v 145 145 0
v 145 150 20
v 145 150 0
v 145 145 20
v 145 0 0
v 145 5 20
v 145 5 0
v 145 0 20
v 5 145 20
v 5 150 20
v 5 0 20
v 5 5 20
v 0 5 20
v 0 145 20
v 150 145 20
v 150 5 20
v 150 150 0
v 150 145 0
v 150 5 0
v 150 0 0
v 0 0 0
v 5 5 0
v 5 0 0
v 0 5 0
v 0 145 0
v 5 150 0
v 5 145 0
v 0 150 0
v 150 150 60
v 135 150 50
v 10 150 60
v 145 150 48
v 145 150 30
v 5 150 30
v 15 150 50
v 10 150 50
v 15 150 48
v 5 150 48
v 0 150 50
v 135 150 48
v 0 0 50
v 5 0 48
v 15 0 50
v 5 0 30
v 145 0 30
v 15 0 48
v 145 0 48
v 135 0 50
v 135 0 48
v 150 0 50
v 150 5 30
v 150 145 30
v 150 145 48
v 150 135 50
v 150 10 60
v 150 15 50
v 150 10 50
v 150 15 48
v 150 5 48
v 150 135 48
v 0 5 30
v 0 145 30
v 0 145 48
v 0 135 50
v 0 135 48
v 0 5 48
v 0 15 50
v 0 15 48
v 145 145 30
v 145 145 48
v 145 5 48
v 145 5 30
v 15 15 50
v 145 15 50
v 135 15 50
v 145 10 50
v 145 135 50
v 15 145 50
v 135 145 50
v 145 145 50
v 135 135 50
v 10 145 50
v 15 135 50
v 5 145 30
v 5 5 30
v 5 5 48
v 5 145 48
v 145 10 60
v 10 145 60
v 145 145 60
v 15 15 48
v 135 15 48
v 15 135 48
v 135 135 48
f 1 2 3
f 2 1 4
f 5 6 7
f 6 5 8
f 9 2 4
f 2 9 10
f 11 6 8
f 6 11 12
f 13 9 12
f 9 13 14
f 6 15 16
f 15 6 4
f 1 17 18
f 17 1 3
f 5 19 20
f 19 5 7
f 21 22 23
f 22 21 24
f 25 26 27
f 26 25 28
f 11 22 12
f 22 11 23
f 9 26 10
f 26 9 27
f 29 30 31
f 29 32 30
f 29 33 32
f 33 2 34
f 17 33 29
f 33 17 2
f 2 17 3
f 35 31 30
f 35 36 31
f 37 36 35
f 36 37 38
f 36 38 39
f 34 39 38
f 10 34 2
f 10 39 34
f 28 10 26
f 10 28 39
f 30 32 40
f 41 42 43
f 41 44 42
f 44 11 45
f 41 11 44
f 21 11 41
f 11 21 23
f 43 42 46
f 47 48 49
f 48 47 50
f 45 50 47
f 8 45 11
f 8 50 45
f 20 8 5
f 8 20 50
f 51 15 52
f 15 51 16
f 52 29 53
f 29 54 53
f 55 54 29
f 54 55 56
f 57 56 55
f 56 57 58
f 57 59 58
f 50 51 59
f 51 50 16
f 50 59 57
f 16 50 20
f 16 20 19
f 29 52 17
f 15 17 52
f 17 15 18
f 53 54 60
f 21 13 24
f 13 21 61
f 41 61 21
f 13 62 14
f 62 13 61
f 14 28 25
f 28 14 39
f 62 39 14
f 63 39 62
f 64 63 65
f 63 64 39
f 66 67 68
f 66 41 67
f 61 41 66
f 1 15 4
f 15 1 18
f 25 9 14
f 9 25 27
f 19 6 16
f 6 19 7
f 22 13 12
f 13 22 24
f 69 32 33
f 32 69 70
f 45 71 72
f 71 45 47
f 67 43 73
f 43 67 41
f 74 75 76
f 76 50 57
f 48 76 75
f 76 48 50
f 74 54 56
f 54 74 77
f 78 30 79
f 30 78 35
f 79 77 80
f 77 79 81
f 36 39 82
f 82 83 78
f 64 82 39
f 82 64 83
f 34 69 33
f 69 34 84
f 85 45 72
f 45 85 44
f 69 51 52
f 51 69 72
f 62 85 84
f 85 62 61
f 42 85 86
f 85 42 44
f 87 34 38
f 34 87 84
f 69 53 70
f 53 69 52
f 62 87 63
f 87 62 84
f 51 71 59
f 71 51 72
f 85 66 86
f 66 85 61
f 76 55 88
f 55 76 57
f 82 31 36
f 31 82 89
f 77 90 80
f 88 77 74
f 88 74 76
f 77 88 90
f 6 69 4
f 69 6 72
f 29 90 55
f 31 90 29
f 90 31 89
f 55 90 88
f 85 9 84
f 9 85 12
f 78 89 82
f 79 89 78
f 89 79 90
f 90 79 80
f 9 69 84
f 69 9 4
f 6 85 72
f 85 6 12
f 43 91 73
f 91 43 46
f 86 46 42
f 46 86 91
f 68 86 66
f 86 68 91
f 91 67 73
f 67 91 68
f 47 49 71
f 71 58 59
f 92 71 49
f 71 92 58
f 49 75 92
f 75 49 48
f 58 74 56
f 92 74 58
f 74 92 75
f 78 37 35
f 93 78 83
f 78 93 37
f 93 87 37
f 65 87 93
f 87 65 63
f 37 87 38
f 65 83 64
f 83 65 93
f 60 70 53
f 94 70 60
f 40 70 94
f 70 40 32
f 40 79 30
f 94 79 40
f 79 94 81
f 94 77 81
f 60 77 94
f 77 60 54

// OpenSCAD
//import("/home/dank/Downloads/Middle_Part.STL");

// 140mm wide on either side, and 50mm tall
// (fan is ~25mm tall, top is ~75mm)
side = 140;
height = 60;
difference() {
  cube([side + 10, side + 10, height]);
  union(){
    // cut out the inside, save for 5mm on each side
    translate([5, 5, 0]){
      cube([side, side, height]);
    }
   
    for (y = [0, 30]) { 
        // cut out all but the corners for 20mm
        translate([5, 0, y]){
          cube([side, side + 10, 20]);
        }
        translate([0, 5, y]){
            cube([side + 10, side, 20]);
        }
    }
    
    // remove one wall entirely
    translate([0, 0, 50]){
        cube([side + 10, 10, 25]);
        cube([10, side + 10, 25]);
    }
  }
}

// add supports for underside of fan
translate([0, 0, 48]){
  cube([15, 15, 2]);
}
translate([side - 5, 0, 48]){
  cube([15, 15, 2]);
}
translate([0, side - 5, 48]){
  cube([15, 15, 2]);
}
translate([side - 5, side - 5, 48]){
  cube([15, 15, 2]);
}
